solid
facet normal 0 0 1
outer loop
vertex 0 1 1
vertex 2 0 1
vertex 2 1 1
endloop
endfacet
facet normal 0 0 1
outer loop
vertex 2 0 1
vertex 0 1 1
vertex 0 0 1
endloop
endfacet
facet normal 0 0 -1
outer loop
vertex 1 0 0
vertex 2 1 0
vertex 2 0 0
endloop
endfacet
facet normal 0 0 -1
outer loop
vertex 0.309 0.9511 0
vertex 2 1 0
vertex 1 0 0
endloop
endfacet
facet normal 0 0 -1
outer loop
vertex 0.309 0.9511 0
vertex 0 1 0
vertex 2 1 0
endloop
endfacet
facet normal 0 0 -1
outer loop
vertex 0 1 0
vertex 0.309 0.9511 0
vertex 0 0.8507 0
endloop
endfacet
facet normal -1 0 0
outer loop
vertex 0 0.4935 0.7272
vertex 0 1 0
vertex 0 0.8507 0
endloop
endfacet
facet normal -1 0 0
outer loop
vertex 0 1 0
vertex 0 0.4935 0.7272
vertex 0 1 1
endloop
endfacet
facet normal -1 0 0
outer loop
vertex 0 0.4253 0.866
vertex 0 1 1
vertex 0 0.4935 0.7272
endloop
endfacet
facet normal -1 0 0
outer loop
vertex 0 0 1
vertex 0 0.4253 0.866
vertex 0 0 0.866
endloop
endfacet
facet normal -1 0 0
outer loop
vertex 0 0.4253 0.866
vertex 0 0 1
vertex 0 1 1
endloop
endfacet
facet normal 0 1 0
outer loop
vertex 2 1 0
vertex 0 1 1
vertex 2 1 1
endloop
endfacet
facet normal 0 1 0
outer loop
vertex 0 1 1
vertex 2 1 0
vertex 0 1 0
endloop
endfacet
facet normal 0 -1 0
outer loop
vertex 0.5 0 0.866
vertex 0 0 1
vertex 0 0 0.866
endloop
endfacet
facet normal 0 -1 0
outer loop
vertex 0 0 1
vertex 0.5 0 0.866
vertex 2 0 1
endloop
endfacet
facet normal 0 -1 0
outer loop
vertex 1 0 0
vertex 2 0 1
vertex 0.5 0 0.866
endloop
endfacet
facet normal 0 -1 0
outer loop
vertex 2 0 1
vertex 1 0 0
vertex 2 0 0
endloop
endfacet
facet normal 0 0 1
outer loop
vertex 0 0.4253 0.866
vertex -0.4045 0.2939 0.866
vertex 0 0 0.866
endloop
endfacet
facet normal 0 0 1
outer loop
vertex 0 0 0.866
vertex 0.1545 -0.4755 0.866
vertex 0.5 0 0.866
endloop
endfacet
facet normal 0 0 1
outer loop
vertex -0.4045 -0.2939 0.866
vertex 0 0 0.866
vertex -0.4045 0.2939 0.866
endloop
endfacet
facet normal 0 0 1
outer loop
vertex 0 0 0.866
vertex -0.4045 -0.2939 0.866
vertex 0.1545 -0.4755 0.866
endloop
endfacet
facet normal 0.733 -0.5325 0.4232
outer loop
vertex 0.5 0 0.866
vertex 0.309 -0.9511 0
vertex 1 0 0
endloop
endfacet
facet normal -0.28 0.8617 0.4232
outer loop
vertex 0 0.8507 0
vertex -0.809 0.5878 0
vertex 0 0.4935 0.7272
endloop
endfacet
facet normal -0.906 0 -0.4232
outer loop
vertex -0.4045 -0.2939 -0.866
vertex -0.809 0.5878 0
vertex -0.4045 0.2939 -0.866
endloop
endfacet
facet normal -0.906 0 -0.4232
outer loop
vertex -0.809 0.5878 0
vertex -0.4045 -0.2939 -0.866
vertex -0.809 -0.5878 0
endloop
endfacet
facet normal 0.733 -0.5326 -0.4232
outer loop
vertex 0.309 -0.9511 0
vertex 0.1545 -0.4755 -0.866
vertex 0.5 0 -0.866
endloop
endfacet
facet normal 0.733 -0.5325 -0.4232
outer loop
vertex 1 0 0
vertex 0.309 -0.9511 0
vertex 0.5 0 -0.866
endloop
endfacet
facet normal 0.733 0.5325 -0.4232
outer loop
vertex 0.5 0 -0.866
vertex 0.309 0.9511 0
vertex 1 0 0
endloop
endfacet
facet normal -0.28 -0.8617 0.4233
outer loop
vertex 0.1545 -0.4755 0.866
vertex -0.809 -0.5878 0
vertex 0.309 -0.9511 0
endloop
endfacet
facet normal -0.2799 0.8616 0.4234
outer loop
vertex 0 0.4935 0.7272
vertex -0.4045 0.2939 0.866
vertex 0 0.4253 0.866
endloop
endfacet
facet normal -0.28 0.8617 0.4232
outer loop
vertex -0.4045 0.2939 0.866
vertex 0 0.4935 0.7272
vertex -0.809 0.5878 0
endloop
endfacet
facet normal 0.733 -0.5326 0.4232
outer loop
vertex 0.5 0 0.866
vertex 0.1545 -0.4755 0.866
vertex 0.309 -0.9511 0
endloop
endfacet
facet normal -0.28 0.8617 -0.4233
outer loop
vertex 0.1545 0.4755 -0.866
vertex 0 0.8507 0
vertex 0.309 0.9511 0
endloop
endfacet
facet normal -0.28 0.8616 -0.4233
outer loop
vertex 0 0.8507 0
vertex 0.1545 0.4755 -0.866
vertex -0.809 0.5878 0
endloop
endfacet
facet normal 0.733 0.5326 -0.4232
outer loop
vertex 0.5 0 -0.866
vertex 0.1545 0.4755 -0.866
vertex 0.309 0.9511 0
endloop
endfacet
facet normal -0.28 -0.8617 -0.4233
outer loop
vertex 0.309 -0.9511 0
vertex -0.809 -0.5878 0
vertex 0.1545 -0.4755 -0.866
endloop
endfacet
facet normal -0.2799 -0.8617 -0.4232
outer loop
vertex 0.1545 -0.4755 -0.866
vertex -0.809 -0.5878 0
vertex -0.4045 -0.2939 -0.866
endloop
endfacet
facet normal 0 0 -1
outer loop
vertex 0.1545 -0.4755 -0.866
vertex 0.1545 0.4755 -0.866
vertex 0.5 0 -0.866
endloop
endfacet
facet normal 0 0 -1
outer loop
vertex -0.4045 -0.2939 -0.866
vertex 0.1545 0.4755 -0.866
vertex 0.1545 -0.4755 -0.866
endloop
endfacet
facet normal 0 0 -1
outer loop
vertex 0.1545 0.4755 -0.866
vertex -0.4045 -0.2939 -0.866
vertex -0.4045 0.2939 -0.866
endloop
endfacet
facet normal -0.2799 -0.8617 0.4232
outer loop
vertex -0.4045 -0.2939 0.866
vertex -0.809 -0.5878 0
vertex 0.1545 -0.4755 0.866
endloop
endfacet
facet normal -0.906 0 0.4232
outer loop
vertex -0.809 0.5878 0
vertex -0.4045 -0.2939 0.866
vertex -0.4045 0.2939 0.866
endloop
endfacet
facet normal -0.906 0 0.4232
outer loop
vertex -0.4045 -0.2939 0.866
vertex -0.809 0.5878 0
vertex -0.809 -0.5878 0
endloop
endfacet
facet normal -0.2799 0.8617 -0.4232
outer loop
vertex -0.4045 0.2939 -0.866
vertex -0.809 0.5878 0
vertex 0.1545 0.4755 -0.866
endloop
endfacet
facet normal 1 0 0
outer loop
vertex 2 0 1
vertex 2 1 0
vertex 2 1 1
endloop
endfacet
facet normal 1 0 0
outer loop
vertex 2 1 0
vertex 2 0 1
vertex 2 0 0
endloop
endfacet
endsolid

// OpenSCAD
module m() { cube(); sphere(); }
m();
module w() { cube(); }
translate([1, 0, 0]) w();
union() w();
module empty() {}
empty();
